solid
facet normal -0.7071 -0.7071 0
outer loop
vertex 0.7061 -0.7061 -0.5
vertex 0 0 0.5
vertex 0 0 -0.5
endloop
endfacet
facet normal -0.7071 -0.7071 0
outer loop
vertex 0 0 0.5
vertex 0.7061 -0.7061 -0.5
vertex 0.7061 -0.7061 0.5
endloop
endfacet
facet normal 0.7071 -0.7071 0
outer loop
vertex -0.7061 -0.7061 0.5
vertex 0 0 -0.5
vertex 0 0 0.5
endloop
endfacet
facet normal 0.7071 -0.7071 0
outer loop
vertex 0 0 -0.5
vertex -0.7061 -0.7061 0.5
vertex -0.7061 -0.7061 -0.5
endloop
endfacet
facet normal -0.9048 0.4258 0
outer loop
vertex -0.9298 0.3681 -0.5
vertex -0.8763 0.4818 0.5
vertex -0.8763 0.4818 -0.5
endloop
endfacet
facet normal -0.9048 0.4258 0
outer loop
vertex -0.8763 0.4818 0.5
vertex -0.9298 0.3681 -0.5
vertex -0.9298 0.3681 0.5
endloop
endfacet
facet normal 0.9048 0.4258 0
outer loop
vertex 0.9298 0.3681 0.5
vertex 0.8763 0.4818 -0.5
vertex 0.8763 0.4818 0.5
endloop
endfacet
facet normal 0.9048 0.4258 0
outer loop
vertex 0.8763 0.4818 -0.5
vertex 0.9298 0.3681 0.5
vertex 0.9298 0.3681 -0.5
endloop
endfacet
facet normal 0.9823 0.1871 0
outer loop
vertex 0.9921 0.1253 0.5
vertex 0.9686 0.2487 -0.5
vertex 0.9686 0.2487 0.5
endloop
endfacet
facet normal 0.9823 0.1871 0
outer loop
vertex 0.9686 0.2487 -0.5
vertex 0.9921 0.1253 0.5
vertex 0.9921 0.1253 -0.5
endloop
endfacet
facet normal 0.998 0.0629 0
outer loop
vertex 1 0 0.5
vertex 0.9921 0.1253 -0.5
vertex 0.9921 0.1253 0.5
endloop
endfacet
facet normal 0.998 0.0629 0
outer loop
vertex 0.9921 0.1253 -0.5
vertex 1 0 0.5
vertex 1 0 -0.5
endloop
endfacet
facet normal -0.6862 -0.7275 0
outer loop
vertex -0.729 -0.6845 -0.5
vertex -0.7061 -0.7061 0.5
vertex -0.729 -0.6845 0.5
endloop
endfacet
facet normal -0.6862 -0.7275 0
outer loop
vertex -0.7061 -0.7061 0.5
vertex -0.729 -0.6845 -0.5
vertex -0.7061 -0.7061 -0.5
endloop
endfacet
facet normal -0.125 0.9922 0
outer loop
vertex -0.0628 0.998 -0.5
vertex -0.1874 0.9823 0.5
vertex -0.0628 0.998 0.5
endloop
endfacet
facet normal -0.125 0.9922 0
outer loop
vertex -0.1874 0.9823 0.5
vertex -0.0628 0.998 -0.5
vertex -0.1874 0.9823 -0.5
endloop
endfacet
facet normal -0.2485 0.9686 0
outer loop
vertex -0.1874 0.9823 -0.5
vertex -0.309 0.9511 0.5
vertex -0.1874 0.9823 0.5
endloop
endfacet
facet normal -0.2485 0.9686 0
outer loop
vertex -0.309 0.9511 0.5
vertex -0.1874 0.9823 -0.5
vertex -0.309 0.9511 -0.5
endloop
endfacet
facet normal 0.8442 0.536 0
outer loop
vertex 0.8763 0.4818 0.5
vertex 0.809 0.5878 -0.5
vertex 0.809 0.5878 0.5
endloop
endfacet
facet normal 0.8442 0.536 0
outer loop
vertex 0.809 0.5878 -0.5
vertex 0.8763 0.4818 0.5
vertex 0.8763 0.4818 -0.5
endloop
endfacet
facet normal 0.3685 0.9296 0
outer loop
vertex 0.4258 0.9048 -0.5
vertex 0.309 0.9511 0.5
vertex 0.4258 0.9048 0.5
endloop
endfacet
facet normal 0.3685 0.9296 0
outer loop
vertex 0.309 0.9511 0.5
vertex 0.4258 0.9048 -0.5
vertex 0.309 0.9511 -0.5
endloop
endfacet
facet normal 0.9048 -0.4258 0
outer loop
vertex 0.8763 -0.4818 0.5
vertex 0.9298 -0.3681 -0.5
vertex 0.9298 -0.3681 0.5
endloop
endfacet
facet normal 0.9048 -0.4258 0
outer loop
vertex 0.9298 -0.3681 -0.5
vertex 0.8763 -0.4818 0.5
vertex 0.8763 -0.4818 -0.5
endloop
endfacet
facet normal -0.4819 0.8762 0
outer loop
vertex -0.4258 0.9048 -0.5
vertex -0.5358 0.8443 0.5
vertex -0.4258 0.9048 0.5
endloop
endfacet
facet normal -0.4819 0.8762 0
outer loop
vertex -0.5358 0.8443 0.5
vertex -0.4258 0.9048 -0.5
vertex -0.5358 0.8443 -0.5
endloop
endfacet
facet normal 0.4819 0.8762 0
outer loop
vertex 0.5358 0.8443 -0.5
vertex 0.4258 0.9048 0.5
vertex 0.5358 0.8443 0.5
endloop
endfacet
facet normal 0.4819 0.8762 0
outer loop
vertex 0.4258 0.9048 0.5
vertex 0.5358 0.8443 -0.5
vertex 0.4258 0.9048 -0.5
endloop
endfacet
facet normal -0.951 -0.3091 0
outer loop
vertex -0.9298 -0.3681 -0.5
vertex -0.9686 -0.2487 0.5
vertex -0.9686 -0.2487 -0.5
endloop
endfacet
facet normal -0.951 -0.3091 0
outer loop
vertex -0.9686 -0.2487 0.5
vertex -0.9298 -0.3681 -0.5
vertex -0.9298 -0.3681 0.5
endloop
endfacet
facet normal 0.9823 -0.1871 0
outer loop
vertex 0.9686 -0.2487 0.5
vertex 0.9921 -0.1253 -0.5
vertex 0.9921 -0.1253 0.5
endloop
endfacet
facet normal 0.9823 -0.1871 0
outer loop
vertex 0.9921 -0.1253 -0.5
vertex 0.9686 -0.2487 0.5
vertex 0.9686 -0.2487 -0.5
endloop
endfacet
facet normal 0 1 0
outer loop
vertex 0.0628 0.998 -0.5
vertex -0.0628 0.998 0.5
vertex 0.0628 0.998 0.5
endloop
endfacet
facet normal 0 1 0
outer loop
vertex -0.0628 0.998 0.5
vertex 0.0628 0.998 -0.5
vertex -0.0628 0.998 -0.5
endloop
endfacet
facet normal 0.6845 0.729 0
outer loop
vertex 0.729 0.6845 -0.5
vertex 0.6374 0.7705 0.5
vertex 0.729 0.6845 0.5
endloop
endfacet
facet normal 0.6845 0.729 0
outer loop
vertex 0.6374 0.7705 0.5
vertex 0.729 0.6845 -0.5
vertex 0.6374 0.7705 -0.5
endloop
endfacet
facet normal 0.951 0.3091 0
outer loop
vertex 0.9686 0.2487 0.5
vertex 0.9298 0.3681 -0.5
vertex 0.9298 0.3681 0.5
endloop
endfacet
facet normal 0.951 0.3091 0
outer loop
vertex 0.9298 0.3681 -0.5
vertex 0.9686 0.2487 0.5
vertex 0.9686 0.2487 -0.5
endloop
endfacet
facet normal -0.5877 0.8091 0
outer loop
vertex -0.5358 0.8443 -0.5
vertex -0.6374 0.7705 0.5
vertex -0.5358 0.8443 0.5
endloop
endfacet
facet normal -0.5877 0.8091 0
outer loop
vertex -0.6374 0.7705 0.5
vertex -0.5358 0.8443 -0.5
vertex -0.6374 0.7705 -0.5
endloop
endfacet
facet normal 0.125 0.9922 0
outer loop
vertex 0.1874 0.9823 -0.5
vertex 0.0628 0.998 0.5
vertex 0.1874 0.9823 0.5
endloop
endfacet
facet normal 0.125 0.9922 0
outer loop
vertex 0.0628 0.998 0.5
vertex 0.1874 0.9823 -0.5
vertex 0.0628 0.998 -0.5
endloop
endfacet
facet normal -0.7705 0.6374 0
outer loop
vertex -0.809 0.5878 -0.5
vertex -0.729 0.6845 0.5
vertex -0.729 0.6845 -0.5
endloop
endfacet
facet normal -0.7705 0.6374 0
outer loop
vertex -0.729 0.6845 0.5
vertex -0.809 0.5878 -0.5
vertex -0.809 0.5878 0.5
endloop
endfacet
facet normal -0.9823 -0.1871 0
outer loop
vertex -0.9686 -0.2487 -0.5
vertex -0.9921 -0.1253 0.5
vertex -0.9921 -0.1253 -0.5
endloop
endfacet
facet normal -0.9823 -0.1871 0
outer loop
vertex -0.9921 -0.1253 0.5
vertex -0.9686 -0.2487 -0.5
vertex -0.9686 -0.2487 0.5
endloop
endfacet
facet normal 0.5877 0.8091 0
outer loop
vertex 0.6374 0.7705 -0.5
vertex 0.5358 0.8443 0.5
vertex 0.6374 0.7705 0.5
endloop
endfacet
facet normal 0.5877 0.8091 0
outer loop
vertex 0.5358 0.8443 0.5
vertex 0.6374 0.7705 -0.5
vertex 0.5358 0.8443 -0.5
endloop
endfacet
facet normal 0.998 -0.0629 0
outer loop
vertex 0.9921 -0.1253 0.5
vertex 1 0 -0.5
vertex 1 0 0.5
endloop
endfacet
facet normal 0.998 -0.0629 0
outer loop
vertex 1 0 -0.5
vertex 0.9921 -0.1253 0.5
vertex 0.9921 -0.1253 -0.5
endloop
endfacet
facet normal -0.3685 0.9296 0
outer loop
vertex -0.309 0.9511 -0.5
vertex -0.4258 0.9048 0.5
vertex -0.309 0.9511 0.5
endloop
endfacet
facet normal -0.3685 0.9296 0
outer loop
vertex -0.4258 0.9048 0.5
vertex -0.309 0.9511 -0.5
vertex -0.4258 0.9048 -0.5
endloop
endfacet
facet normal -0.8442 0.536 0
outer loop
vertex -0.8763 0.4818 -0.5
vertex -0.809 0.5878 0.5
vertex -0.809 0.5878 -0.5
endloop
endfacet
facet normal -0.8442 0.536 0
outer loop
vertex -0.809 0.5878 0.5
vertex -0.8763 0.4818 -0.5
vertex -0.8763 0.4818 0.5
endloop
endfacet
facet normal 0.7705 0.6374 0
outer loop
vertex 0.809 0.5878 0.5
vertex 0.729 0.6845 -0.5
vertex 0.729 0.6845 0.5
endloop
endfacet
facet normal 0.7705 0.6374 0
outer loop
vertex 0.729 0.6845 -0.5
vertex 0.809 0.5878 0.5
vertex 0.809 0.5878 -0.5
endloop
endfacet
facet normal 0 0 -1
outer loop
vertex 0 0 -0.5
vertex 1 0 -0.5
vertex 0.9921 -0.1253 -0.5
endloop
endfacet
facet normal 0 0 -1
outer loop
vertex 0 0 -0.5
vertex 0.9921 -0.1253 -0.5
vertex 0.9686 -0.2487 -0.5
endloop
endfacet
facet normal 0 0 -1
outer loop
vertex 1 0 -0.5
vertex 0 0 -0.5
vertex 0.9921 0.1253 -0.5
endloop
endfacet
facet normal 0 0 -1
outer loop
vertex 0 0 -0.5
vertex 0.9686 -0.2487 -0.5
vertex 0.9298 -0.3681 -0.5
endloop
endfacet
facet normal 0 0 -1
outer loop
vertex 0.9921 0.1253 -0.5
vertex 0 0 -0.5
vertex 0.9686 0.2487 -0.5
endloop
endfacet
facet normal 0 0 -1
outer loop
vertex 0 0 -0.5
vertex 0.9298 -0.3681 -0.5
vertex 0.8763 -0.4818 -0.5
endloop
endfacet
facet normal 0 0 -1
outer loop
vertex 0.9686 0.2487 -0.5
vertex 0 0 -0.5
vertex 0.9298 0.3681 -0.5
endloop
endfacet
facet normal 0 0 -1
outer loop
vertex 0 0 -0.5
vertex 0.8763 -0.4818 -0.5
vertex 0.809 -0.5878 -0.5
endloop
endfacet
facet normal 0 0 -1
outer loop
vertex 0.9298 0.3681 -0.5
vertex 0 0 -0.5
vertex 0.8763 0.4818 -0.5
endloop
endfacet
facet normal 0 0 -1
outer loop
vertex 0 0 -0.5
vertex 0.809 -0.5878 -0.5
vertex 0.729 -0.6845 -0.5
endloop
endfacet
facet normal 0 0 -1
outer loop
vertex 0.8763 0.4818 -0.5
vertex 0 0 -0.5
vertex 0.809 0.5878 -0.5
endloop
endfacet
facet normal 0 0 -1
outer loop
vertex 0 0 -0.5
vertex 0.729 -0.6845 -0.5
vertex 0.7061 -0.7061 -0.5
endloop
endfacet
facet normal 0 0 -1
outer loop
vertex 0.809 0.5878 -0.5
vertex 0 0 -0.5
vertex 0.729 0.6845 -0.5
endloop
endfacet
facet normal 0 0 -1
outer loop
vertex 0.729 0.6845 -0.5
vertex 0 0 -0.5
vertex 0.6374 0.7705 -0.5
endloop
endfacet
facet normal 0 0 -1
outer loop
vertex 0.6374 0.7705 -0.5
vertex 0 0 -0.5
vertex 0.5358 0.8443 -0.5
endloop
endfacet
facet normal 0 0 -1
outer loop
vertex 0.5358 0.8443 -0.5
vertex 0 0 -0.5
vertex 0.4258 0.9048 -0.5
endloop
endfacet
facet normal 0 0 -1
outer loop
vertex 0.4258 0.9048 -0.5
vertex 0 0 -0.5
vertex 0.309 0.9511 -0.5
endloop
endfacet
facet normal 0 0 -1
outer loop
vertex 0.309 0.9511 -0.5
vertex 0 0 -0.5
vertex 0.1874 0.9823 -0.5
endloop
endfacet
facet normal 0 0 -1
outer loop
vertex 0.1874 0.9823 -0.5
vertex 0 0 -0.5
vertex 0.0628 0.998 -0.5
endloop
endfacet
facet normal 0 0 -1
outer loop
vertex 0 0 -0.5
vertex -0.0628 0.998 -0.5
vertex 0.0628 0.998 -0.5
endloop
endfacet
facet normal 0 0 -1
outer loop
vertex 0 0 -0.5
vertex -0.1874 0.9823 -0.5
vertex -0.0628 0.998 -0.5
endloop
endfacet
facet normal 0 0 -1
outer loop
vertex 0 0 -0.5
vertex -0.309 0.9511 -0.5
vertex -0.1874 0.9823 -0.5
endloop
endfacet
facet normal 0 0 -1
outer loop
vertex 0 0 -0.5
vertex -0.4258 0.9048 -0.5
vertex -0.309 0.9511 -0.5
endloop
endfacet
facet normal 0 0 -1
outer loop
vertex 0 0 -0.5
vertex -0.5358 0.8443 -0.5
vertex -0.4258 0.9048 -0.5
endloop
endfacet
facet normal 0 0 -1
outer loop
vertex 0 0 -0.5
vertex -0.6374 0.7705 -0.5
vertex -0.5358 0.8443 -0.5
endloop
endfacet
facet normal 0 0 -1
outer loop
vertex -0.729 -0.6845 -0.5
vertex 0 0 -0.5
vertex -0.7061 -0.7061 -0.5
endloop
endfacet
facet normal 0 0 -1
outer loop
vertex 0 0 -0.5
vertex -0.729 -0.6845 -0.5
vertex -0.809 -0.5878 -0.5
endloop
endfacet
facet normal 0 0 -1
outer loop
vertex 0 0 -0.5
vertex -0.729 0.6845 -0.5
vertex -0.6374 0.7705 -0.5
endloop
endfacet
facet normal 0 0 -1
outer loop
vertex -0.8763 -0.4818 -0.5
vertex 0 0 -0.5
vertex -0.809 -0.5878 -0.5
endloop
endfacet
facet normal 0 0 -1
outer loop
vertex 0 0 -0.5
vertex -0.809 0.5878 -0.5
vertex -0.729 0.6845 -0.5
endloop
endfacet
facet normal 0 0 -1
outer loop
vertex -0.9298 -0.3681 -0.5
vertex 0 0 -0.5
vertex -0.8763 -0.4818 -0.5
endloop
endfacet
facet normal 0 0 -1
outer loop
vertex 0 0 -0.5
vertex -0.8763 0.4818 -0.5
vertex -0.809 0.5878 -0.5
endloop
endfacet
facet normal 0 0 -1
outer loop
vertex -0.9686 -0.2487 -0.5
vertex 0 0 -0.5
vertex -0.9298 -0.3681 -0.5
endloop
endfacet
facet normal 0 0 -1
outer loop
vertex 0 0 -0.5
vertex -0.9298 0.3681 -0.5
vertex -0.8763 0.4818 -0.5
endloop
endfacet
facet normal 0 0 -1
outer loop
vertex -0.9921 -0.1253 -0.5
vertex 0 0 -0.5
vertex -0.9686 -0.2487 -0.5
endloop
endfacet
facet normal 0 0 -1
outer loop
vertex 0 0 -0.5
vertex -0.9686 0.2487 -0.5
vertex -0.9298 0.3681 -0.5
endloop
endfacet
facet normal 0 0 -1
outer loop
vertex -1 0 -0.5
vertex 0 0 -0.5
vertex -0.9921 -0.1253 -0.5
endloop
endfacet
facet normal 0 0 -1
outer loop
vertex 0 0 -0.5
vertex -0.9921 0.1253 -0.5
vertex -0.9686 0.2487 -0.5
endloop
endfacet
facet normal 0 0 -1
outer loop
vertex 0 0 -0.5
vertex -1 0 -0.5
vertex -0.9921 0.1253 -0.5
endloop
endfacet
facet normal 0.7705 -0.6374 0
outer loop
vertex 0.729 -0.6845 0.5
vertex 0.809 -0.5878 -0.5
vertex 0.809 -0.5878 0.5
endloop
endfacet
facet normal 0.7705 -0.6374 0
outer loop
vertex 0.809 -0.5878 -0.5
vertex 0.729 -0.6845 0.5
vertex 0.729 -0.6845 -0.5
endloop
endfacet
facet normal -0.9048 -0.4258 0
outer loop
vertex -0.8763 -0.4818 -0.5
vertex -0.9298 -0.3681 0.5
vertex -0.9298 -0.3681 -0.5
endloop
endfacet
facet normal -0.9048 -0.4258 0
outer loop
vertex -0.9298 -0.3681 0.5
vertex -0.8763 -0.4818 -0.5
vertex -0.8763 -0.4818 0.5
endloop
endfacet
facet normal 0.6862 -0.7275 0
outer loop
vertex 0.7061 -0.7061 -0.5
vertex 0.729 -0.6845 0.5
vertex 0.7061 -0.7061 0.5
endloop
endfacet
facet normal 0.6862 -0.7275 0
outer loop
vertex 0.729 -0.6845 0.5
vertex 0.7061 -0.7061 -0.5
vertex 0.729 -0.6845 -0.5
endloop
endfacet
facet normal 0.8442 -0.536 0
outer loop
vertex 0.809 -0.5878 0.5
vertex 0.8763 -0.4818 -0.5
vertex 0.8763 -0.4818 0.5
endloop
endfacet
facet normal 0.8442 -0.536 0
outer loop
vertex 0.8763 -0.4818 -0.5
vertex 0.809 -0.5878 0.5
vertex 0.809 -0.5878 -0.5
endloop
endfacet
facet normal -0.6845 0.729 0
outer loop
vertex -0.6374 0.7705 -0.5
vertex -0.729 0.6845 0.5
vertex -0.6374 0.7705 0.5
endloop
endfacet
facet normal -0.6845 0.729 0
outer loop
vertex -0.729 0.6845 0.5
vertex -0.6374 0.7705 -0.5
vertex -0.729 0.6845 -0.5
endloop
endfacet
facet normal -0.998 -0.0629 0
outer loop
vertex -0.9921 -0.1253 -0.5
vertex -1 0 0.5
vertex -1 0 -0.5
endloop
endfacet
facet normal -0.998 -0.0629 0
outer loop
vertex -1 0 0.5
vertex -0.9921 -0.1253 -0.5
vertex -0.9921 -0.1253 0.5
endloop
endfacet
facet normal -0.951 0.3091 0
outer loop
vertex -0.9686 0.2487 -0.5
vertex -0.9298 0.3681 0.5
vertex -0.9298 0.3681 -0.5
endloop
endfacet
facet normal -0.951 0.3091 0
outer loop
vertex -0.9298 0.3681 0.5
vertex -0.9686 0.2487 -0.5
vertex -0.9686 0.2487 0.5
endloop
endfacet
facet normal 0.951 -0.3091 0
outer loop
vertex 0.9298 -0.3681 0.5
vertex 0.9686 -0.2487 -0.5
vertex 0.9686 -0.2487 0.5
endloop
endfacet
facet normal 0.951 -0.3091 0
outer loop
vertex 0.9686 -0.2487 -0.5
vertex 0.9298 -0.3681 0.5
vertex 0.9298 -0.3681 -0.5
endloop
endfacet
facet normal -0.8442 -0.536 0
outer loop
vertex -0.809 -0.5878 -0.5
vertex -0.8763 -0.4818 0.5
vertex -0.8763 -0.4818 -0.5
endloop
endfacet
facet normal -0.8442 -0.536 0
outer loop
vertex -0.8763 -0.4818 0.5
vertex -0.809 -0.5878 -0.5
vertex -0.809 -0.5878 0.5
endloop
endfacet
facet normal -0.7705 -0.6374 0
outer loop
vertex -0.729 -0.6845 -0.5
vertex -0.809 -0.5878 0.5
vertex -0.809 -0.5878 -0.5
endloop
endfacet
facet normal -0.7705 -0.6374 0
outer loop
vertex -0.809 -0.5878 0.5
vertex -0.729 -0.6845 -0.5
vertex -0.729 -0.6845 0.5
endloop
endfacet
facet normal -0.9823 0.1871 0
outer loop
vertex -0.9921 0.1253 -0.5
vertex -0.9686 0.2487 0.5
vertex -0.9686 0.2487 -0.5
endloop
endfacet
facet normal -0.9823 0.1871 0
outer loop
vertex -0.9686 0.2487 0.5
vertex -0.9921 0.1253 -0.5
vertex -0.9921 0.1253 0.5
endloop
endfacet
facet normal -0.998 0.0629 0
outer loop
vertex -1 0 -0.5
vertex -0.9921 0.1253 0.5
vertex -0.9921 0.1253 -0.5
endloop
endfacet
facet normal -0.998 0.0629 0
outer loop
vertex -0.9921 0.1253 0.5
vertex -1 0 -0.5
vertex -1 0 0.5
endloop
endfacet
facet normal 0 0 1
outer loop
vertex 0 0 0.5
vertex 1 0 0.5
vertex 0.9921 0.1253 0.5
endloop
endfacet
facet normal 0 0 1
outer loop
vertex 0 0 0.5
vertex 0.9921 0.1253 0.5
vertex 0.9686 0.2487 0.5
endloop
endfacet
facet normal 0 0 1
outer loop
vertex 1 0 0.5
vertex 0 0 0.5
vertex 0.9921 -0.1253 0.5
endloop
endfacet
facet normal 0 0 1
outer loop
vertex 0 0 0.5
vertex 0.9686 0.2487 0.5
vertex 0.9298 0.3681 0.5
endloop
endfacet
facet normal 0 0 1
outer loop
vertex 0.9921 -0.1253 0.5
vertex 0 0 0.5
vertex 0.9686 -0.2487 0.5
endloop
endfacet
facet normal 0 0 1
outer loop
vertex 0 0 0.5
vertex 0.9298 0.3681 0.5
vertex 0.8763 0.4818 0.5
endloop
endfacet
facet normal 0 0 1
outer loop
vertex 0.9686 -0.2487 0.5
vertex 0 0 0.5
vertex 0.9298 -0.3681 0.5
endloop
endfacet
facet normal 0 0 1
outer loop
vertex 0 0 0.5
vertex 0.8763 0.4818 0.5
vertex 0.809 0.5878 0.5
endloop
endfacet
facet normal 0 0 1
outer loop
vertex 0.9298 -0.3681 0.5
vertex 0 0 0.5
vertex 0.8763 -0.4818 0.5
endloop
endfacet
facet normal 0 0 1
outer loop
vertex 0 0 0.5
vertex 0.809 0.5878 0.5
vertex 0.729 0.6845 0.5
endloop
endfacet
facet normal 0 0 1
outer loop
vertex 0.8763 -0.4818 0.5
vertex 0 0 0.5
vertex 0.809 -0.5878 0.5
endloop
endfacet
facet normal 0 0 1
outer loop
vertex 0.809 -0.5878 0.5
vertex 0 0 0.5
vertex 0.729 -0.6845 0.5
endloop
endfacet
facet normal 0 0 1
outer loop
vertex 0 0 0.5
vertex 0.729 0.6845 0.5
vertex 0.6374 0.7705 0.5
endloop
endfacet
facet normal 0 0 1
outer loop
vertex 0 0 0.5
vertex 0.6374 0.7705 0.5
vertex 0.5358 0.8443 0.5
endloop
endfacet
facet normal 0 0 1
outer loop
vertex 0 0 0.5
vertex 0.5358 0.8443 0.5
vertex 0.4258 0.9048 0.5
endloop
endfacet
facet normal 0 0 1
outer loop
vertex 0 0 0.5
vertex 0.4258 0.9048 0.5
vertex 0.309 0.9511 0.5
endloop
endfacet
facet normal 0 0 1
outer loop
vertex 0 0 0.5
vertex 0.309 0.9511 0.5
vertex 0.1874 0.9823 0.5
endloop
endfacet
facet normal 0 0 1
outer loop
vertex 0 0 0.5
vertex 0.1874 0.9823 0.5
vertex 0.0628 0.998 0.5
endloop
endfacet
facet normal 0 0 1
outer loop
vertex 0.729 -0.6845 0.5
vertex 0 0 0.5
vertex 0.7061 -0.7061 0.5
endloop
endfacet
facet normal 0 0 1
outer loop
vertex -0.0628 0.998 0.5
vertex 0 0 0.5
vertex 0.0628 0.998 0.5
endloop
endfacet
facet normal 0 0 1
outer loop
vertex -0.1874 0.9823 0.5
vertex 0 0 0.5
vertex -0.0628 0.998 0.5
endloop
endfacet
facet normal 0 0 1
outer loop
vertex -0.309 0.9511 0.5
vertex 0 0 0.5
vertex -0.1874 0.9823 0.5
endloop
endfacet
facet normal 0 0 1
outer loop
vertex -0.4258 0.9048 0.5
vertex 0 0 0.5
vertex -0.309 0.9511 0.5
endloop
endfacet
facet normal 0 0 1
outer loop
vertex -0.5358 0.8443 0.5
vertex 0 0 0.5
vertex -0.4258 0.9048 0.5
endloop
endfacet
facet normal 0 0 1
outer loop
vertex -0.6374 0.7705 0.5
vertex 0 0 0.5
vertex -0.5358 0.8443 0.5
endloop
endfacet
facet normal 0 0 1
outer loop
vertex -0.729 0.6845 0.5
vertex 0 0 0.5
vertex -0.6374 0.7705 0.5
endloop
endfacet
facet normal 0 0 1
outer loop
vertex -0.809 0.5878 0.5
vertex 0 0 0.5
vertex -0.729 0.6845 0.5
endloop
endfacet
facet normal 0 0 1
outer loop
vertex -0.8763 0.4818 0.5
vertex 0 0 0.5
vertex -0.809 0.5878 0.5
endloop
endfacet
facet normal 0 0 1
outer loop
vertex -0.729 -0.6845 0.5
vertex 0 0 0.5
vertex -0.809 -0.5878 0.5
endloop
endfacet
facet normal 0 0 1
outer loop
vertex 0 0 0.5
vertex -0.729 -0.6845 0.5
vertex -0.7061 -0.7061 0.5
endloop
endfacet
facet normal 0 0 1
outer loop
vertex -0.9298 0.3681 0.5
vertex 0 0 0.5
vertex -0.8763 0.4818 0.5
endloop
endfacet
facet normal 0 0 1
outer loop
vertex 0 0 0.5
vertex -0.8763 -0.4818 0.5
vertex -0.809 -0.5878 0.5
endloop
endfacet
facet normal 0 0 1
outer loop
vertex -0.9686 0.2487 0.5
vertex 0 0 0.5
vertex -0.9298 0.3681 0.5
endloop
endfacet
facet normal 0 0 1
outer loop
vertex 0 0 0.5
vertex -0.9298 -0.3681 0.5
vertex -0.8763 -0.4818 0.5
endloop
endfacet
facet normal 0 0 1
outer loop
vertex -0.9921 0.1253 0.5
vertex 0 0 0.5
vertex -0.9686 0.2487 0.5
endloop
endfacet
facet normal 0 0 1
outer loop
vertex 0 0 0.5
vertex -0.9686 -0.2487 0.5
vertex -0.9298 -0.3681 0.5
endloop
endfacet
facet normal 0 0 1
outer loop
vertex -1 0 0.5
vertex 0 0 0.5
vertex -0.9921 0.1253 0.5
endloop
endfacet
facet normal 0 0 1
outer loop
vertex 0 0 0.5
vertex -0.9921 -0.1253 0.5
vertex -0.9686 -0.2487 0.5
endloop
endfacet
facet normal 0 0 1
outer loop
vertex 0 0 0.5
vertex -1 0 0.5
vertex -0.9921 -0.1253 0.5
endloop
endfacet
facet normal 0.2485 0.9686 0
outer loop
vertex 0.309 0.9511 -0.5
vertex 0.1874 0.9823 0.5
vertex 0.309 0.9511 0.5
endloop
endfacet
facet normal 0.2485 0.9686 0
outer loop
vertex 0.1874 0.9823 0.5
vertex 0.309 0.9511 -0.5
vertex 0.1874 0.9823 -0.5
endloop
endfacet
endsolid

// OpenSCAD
/*
 * Module wedge.scad
 * this comes from  https://github.com/chrisspen/openscad-extra, which is covered under MIT License
 *
 * it is used by module torus.scad which is from the same source
 */

// Copyright 2013 Jonathan Hulka
// This program is free software; you can redistribute it and/or modify
// it under the terms of the GNU General Public License as published by
// the Free Software Foundation; either version 2 of the License, or
// (at your option) any later version.
// 
// This program is distributed in the hope that it will be useful,
// but WITHOUT ANY WARRANTY; without even the implied warranty of
// MERCHANTABILITY or FITNESS FOR A PARTICULAR PURPOSE.  See the
// GNU General Public License for more details.
// 
// You should have received a copy of the GNU General Public License
// along with this program; if not, write to the Free Software
// Foundation, Inc., 51 Franklin Street, Fifth Floor, Boston,
// MA 02110-1301, USA.

/*
 * Module torus.scad
 * this comes from  https://github.com/chrisspen/openscad-extra, which is covered under MIT License
 *
 * it references module wedge.scad which is from the same source
 */


//Creates a wedge-shaped section of a cylinder
//The result is centered with the open part of the wedge facing in the positive y direction
//h - height
//r - radius
//a - angle
//$fn=100;
module wedge(h, r, a, $fn=50)
{
    th=(a%360)/2;
    difference()
    {
        cylinder(h=h,r=r,center=true, $fn=$fn);
        if(th<90)
        {
            for(n=[-1,1])rotate(-th*n)translate([(r+0.5)*n,0,0])
                cube(size=[r*2+1,r*2+1,h+1],center=true);
        }
        else
        {
            intersection()
            {
                rotate(-th)translate([(r+0.5),(r+0.5),0])
                    cube(size=[r*2+1,r*2+1,h+1],center=true);
                rotate(th)translate([-(r+0.5),(r+0.5),0])
                    cube(size=[r*2+1,r*2+1,h+1],center=true);
            }
        }
    }
}

wedge(h=1, r=1, a=270);
